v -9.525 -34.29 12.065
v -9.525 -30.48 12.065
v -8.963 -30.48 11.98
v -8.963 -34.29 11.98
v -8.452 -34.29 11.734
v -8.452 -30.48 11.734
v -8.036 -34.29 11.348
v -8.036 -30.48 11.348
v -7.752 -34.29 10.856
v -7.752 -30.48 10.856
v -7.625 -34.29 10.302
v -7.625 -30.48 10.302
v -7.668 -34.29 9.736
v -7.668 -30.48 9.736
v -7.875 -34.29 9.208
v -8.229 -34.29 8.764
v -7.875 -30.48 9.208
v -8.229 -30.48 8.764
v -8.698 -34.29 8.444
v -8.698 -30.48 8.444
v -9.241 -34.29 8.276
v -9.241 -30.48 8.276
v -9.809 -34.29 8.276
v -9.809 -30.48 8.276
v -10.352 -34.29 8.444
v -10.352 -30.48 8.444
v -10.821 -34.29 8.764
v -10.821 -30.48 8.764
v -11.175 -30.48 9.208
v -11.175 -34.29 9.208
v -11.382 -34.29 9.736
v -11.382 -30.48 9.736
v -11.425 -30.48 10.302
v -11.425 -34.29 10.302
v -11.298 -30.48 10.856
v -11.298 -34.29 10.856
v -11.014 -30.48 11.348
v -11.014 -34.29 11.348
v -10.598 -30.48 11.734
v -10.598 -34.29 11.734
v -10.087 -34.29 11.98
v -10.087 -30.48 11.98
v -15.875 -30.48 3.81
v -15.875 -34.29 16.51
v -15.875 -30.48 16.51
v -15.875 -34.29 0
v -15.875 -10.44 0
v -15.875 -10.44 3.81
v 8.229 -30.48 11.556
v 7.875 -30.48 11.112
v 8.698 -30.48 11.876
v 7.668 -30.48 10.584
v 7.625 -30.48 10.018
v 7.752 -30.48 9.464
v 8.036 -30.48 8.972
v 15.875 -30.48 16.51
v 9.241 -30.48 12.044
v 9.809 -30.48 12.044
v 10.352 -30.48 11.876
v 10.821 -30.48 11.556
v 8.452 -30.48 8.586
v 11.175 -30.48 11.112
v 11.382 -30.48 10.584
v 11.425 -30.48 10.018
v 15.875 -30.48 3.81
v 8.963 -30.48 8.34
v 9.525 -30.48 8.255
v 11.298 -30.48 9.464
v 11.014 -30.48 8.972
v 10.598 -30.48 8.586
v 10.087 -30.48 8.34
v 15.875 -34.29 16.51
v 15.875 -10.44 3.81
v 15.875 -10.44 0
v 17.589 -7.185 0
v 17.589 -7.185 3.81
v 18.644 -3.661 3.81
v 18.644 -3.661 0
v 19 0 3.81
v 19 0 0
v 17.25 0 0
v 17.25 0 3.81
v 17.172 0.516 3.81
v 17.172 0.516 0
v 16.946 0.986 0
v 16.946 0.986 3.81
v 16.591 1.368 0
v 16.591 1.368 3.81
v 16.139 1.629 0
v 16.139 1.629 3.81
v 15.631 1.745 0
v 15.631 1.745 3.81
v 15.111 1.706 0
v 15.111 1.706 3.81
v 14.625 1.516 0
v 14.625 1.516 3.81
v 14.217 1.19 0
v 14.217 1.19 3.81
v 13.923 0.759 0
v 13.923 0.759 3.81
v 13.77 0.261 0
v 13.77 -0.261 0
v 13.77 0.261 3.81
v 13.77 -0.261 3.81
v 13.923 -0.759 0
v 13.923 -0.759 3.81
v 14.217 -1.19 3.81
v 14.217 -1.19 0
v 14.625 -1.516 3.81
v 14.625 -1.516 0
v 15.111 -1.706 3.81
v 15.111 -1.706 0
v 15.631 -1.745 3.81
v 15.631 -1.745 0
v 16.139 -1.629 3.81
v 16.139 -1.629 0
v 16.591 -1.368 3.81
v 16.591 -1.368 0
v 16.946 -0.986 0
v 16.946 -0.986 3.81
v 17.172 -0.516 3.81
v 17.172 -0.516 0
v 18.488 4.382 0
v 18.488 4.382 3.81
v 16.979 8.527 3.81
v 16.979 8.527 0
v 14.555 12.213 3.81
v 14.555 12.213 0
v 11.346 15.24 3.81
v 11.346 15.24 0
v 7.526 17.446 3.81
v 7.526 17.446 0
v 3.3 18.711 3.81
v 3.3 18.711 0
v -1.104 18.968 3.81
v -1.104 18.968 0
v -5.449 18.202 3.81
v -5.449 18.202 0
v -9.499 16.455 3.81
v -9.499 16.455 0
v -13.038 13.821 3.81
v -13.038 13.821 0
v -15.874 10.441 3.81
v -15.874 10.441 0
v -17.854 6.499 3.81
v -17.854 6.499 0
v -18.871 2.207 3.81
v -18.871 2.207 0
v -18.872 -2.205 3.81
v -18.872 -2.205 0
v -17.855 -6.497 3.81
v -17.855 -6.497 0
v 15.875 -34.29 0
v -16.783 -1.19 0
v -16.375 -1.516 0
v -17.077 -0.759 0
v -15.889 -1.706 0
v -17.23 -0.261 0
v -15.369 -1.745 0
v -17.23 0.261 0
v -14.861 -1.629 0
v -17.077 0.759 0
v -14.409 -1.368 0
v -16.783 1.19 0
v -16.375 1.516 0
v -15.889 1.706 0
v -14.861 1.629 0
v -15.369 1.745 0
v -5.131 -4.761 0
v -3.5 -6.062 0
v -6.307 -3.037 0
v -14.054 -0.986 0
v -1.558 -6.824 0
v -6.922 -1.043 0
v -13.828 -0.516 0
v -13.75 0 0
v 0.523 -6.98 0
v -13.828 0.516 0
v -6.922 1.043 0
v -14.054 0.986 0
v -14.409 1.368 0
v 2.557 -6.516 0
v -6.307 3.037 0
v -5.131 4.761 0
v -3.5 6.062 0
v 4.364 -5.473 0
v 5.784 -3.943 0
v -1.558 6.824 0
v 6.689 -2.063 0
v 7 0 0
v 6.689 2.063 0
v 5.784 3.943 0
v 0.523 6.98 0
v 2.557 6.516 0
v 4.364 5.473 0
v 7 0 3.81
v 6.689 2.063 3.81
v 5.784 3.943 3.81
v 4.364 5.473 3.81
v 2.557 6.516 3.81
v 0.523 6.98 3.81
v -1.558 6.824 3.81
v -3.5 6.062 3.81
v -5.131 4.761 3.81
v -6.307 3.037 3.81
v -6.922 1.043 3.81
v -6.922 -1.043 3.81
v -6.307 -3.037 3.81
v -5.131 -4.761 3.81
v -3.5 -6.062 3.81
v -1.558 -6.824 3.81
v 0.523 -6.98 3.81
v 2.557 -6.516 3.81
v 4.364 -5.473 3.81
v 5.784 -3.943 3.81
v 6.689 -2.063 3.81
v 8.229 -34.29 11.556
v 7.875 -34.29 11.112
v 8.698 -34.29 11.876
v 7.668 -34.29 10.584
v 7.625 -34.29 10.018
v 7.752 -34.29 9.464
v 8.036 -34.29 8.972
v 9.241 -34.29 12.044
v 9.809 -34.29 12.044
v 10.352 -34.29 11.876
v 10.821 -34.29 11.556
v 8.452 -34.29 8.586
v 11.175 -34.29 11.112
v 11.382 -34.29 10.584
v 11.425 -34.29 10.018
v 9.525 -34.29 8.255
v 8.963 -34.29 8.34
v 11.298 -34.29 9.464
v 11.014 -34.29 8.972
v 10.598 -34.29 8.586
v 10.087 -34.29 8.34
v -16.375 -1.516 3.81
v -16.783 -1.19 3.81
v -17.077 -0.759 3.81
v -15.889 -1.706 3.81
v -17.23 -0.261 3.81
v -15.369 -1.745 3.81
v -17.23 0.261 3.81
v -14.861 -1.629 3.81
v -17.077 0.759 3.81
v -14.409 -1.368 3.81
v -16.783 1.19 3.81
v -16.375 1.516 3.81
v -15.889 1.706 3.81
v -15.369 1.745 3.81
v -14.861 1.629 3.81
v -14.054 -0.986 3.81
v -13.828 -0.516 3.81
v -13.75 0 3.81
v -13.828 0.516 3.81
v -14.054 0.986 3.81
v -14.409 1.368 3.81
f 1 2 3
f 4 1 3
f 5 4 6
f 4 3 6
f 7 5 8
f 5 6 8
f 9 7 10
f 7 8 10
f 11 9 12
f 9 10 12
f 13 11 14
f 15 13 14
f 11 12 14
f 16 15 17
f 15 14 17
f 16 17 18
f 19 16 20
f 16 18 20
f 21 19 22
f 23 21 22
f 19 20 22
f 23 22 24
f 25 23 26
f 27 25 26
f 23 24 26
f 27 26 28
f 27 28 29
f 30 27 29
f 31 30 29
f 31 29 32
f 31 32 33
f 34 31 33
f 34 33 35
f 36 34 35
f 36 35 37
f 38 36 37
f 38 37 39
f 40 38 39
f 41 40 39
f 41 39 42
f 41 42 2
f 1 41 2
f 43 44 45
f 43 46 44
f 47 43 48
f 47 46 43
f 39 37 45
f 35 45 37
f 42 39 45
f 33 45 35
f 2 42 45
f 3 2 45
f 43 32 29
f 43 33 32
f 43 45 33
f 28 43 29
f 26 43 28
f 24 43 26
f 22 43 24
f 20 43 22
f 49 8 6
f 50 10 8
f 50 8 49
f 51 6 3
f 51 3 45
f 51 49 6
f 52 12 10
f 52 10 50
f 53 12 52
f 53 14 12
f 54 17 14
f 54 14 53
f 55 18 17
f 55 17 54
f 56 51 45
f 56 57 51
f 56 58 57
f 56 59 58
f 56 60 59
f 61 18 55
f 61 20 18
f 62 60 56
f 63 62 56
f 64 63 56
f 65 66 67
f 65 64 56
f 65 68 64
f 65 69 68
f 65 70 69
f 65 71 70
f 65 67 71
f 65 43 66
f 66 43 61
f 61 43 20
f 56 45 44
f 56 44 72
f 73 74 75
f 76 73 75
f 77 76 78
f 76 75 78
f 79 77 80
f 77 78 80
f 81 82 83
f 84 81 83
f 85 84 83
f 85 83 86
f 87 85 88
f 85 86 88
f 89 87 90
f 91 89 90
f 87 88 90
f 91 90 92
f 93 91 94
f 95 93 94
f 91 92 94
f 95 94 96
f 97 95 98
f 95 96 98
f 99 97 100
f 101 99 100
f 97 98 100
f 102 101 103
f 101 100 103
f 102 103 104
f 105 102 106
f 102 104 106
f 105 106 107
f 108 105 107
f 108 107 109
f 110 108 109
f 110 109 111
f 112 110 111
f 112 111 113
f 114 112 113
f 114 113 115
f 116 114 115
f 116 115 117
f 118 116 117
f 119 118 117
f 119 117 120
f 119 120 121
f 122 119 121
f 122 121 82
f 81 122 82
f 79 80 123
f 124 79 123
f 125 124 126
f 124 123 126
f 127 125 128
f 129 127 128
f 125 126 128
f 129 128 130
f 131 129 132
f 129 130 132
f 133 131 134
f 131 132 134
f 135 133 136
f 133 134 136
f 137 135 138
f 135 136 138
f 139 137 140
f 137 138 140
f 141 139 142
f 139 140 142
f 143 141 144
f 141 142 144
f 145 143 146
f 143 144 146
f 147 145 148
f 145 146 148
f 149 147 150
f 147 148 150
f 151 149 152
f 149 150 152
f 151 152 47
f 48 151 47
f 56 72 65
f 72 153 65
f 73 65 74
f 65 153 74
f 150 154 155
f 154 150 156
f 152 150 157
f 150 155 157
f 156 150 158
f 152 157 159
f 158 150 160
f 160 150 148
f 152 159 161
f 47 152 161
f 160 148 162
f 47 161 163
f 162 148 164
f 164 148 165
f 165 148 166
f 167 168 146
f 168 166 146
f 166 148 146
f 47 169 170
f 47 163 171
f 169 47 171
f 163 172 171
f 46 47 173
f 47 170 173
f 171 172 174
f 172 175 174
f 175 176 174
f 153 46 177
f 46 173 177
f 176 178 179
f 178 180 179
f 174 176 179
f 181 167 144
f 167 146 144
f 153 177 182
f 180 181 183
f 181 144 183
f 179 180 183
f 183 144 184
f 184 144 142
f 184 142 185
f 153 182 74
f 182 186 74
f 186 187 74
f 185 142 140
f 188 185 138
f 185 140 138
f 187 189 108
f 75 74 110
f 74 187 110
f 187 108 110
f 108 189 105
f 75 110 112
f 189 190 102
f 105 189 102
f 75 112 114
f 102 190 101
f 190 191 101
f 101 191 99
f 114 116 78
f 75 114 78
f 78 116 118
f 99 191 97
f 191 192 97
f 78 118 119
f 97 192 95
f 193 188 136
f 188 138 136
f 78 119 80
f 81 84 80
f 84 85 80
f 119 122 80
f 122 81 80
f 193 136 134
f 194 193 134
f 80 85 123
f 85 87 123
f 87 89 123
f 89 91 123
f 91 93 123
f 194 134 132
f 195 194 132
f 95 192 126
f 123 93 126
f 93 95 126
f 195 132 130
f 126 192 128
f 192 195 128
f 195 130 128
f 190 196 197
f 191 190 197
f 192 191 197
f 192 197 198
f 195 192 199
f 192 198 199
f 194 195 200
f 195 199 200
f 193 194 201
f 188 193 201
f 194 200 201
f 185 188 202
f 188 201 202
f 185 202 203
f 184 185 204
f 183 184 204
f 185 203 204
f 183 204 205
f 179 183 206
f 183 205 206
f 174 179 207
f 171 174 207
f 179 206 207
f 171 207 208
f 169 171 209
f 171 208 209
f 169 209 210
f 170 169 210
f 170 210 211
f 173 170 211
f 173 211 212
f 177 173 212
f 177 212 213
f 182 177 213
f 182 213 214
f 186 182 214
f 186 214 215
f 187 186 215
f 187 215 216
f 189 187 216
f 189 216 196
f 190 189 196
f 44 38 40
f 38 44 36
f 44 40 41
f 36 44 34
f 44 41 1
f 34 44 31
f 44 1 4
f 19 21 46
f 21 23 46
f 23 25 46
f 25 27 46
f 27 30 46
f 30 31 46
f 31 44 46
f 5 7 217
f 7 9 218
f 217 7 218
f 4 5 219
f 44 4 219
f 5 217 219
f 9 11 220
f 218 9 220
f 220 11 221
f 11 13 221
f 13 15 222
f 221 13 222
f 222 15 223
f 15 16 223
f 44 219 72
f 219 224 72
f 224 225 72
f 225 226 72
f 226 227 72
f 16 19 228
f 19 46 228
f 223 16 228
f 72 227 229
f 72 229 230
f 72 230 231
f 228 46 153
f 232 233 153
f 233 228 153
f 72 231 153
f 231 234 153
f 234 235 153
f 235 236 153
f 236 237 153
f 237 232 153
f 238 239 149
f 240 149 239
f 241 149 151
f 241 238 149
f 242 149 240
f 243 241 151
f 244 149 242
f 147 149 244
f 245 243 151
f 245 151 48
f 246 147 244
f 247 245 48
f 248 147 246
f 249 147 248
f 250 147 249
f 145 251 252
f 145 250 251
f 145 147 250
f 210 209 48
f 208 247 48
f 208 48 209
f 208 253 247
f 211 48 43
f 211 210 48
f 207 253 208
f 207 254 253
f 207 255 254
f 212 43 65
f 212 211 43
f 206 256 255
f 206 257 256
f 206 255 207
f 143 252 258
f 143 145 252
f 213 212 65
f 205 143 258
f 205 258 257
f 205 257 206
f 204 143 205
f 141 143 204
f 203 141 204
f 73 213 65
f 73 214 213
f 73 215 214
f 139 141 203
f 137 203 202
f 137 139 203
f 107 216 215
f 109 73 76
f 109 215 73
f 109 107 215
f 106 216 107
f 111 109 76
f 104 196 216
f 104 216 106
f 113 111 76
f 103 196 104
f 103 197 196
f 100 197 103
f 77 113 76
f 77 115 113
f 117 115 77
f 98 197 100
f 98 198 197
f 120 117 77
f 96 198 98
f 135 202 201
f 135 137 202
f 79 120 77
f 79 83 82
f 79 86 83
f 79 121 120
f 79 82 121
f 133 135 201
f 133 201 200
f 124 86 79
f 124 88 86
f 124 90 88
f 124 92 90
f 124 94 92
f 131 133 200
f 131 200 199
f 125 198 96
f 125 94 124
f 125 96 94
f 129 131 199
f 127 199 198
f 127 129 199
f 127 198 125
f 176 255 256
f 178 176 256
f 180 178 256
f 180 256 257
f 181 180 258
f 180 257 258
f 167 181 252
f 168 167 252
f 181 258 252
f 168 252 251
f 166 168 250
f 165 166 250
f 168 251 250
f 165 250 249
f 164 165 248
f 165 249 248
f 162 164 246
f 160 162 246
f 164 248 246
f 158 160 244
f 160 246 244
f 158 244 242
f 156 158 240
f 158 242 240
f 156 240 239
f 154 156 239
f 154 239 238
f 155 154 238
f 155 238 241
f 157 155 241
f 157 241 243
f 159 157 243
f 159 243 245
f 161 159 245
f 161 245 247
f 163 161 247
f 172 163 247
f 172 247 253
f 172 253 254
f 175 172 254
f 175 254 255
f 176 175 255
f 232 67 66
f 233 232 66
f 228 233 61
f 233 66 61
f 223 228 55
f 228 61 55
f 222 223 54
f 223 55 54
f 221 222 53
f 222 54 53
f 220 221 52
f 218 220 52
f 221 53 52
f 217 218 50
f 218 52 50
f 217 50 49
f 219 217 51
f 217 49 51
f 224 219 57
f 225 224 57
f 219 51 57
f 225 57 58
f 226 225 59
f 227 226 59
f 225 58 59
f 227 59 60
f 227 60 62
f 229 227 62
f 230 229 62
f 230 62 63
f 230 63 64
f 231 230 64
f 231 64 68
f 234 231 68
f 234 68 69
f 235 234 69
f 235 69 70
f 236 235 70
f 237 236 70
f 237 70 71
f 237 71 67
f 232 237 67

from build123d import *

# Parameters (mm, degrees)
BOSS_EXTRUDE1_DEPTH = 3.81
SKETCH3_R           = 7
CUT_EXTRUDE1_DEPTH  = 40.386802358
SKETCH4_W           = 31.75
SKETCH4_H           = 3.81
BOSS_EXTRUDE2_DEPTH = 12.7
SKETCH5_R           = 1.905
CUT_EXTRUDE2_DEPTH  = 56.514417046
SKETCH6_R           = 1.75
CUT_EXTRUDE3_DEPTH  = 42.207937342


with BuildPart() as part:
    # Sketch1 → Boss-Extrude1 (new body)
    with BuildSketch(Plane.XY):
        with BuildLine():
            ThreePointArc((19, 0), (-5.448623679, 18.201991649), (-15.875, -10.43955818))
            Line((-15.875, -10.43955818), (15.875, -10.43955818))
            ThreePointArc((15.875, -10.43955818), (18.201991649, -5.448623679), (19, 0))
        make_face()
        with BuildLine():
            ThreePointArc((15.875, -10.43955818), (0, -19), (-15.875, -10.43955818))
            Line((-15.875, -10.43955818), (-15.875, -34.29))
            Line((-15.875, -34.29), (15.875, -34.29))
            Line((15.875, -34.29), (15.875, -10.43955818))
        make_face()
        with BuildLine():
            Line((15.875, -10.43955818), (-15.875, -10.43955818))
            ThreePointArc((-15.875, -10.43955818), (0, -19), (15.875, -10.43955818))
        make_face()
    extrude(amount=BOSS_EXTRUDE1_DEPTH)

    # Sketch3 → Cut-Extrude1 (cut, through all)
    with BuildSketch(Plane.XY.offset(3.81)):
        Circle(SKETCH3_R)
    extrude(amount=-CUT_EXTRUDE1_DEPTH, mode=Mode.SUBTRACT)

    # Sketch4 → Boss-Extrude2 (add)
    with BuildSketch(Plane.XY.offset(3.81)):
        with Locations((0, -32.385)):
            Rectangle(SKETCH4_W, SKETCH4_H)
    extrude(amount=BOSS_EXTRUDE2_DEPTH)

    # Sketch5 → Cut-Extrude2 (cut, through all)
    with BuildSketch(Plane(origin=(0, -30.48, 0), x_dir=(1, 0, 0), z_dir=(0, 1, 0))):
        with Locations(Location((-9.525, -10.16, 0), (0, 0, 270))):
            Circle(SKETCH5_R)
        with Locations(Location((9.525, -10.16, 0), (0, 0, 90))):
            Circle(SKETCH5_R)
    extrude(amount=-CUT_EXTRUDE2_DEPTH, mode=Mode.SUBTRACT)

    # Sketch6 → Cut-Extrude3 (cut, through all)
    with BuildSketch(Plane.XY.offset(3.81)):
        with Locations((15.5, 0)):
            Circle(SKETCH6_R)
        with Locations((-15.5, 0)):
            Circle(SKETCH6_R)
    extrude(amount=-CUT_EXTRUDE3_DEPTH, mode=Mode.SUBTRACT)


solid = part.part
